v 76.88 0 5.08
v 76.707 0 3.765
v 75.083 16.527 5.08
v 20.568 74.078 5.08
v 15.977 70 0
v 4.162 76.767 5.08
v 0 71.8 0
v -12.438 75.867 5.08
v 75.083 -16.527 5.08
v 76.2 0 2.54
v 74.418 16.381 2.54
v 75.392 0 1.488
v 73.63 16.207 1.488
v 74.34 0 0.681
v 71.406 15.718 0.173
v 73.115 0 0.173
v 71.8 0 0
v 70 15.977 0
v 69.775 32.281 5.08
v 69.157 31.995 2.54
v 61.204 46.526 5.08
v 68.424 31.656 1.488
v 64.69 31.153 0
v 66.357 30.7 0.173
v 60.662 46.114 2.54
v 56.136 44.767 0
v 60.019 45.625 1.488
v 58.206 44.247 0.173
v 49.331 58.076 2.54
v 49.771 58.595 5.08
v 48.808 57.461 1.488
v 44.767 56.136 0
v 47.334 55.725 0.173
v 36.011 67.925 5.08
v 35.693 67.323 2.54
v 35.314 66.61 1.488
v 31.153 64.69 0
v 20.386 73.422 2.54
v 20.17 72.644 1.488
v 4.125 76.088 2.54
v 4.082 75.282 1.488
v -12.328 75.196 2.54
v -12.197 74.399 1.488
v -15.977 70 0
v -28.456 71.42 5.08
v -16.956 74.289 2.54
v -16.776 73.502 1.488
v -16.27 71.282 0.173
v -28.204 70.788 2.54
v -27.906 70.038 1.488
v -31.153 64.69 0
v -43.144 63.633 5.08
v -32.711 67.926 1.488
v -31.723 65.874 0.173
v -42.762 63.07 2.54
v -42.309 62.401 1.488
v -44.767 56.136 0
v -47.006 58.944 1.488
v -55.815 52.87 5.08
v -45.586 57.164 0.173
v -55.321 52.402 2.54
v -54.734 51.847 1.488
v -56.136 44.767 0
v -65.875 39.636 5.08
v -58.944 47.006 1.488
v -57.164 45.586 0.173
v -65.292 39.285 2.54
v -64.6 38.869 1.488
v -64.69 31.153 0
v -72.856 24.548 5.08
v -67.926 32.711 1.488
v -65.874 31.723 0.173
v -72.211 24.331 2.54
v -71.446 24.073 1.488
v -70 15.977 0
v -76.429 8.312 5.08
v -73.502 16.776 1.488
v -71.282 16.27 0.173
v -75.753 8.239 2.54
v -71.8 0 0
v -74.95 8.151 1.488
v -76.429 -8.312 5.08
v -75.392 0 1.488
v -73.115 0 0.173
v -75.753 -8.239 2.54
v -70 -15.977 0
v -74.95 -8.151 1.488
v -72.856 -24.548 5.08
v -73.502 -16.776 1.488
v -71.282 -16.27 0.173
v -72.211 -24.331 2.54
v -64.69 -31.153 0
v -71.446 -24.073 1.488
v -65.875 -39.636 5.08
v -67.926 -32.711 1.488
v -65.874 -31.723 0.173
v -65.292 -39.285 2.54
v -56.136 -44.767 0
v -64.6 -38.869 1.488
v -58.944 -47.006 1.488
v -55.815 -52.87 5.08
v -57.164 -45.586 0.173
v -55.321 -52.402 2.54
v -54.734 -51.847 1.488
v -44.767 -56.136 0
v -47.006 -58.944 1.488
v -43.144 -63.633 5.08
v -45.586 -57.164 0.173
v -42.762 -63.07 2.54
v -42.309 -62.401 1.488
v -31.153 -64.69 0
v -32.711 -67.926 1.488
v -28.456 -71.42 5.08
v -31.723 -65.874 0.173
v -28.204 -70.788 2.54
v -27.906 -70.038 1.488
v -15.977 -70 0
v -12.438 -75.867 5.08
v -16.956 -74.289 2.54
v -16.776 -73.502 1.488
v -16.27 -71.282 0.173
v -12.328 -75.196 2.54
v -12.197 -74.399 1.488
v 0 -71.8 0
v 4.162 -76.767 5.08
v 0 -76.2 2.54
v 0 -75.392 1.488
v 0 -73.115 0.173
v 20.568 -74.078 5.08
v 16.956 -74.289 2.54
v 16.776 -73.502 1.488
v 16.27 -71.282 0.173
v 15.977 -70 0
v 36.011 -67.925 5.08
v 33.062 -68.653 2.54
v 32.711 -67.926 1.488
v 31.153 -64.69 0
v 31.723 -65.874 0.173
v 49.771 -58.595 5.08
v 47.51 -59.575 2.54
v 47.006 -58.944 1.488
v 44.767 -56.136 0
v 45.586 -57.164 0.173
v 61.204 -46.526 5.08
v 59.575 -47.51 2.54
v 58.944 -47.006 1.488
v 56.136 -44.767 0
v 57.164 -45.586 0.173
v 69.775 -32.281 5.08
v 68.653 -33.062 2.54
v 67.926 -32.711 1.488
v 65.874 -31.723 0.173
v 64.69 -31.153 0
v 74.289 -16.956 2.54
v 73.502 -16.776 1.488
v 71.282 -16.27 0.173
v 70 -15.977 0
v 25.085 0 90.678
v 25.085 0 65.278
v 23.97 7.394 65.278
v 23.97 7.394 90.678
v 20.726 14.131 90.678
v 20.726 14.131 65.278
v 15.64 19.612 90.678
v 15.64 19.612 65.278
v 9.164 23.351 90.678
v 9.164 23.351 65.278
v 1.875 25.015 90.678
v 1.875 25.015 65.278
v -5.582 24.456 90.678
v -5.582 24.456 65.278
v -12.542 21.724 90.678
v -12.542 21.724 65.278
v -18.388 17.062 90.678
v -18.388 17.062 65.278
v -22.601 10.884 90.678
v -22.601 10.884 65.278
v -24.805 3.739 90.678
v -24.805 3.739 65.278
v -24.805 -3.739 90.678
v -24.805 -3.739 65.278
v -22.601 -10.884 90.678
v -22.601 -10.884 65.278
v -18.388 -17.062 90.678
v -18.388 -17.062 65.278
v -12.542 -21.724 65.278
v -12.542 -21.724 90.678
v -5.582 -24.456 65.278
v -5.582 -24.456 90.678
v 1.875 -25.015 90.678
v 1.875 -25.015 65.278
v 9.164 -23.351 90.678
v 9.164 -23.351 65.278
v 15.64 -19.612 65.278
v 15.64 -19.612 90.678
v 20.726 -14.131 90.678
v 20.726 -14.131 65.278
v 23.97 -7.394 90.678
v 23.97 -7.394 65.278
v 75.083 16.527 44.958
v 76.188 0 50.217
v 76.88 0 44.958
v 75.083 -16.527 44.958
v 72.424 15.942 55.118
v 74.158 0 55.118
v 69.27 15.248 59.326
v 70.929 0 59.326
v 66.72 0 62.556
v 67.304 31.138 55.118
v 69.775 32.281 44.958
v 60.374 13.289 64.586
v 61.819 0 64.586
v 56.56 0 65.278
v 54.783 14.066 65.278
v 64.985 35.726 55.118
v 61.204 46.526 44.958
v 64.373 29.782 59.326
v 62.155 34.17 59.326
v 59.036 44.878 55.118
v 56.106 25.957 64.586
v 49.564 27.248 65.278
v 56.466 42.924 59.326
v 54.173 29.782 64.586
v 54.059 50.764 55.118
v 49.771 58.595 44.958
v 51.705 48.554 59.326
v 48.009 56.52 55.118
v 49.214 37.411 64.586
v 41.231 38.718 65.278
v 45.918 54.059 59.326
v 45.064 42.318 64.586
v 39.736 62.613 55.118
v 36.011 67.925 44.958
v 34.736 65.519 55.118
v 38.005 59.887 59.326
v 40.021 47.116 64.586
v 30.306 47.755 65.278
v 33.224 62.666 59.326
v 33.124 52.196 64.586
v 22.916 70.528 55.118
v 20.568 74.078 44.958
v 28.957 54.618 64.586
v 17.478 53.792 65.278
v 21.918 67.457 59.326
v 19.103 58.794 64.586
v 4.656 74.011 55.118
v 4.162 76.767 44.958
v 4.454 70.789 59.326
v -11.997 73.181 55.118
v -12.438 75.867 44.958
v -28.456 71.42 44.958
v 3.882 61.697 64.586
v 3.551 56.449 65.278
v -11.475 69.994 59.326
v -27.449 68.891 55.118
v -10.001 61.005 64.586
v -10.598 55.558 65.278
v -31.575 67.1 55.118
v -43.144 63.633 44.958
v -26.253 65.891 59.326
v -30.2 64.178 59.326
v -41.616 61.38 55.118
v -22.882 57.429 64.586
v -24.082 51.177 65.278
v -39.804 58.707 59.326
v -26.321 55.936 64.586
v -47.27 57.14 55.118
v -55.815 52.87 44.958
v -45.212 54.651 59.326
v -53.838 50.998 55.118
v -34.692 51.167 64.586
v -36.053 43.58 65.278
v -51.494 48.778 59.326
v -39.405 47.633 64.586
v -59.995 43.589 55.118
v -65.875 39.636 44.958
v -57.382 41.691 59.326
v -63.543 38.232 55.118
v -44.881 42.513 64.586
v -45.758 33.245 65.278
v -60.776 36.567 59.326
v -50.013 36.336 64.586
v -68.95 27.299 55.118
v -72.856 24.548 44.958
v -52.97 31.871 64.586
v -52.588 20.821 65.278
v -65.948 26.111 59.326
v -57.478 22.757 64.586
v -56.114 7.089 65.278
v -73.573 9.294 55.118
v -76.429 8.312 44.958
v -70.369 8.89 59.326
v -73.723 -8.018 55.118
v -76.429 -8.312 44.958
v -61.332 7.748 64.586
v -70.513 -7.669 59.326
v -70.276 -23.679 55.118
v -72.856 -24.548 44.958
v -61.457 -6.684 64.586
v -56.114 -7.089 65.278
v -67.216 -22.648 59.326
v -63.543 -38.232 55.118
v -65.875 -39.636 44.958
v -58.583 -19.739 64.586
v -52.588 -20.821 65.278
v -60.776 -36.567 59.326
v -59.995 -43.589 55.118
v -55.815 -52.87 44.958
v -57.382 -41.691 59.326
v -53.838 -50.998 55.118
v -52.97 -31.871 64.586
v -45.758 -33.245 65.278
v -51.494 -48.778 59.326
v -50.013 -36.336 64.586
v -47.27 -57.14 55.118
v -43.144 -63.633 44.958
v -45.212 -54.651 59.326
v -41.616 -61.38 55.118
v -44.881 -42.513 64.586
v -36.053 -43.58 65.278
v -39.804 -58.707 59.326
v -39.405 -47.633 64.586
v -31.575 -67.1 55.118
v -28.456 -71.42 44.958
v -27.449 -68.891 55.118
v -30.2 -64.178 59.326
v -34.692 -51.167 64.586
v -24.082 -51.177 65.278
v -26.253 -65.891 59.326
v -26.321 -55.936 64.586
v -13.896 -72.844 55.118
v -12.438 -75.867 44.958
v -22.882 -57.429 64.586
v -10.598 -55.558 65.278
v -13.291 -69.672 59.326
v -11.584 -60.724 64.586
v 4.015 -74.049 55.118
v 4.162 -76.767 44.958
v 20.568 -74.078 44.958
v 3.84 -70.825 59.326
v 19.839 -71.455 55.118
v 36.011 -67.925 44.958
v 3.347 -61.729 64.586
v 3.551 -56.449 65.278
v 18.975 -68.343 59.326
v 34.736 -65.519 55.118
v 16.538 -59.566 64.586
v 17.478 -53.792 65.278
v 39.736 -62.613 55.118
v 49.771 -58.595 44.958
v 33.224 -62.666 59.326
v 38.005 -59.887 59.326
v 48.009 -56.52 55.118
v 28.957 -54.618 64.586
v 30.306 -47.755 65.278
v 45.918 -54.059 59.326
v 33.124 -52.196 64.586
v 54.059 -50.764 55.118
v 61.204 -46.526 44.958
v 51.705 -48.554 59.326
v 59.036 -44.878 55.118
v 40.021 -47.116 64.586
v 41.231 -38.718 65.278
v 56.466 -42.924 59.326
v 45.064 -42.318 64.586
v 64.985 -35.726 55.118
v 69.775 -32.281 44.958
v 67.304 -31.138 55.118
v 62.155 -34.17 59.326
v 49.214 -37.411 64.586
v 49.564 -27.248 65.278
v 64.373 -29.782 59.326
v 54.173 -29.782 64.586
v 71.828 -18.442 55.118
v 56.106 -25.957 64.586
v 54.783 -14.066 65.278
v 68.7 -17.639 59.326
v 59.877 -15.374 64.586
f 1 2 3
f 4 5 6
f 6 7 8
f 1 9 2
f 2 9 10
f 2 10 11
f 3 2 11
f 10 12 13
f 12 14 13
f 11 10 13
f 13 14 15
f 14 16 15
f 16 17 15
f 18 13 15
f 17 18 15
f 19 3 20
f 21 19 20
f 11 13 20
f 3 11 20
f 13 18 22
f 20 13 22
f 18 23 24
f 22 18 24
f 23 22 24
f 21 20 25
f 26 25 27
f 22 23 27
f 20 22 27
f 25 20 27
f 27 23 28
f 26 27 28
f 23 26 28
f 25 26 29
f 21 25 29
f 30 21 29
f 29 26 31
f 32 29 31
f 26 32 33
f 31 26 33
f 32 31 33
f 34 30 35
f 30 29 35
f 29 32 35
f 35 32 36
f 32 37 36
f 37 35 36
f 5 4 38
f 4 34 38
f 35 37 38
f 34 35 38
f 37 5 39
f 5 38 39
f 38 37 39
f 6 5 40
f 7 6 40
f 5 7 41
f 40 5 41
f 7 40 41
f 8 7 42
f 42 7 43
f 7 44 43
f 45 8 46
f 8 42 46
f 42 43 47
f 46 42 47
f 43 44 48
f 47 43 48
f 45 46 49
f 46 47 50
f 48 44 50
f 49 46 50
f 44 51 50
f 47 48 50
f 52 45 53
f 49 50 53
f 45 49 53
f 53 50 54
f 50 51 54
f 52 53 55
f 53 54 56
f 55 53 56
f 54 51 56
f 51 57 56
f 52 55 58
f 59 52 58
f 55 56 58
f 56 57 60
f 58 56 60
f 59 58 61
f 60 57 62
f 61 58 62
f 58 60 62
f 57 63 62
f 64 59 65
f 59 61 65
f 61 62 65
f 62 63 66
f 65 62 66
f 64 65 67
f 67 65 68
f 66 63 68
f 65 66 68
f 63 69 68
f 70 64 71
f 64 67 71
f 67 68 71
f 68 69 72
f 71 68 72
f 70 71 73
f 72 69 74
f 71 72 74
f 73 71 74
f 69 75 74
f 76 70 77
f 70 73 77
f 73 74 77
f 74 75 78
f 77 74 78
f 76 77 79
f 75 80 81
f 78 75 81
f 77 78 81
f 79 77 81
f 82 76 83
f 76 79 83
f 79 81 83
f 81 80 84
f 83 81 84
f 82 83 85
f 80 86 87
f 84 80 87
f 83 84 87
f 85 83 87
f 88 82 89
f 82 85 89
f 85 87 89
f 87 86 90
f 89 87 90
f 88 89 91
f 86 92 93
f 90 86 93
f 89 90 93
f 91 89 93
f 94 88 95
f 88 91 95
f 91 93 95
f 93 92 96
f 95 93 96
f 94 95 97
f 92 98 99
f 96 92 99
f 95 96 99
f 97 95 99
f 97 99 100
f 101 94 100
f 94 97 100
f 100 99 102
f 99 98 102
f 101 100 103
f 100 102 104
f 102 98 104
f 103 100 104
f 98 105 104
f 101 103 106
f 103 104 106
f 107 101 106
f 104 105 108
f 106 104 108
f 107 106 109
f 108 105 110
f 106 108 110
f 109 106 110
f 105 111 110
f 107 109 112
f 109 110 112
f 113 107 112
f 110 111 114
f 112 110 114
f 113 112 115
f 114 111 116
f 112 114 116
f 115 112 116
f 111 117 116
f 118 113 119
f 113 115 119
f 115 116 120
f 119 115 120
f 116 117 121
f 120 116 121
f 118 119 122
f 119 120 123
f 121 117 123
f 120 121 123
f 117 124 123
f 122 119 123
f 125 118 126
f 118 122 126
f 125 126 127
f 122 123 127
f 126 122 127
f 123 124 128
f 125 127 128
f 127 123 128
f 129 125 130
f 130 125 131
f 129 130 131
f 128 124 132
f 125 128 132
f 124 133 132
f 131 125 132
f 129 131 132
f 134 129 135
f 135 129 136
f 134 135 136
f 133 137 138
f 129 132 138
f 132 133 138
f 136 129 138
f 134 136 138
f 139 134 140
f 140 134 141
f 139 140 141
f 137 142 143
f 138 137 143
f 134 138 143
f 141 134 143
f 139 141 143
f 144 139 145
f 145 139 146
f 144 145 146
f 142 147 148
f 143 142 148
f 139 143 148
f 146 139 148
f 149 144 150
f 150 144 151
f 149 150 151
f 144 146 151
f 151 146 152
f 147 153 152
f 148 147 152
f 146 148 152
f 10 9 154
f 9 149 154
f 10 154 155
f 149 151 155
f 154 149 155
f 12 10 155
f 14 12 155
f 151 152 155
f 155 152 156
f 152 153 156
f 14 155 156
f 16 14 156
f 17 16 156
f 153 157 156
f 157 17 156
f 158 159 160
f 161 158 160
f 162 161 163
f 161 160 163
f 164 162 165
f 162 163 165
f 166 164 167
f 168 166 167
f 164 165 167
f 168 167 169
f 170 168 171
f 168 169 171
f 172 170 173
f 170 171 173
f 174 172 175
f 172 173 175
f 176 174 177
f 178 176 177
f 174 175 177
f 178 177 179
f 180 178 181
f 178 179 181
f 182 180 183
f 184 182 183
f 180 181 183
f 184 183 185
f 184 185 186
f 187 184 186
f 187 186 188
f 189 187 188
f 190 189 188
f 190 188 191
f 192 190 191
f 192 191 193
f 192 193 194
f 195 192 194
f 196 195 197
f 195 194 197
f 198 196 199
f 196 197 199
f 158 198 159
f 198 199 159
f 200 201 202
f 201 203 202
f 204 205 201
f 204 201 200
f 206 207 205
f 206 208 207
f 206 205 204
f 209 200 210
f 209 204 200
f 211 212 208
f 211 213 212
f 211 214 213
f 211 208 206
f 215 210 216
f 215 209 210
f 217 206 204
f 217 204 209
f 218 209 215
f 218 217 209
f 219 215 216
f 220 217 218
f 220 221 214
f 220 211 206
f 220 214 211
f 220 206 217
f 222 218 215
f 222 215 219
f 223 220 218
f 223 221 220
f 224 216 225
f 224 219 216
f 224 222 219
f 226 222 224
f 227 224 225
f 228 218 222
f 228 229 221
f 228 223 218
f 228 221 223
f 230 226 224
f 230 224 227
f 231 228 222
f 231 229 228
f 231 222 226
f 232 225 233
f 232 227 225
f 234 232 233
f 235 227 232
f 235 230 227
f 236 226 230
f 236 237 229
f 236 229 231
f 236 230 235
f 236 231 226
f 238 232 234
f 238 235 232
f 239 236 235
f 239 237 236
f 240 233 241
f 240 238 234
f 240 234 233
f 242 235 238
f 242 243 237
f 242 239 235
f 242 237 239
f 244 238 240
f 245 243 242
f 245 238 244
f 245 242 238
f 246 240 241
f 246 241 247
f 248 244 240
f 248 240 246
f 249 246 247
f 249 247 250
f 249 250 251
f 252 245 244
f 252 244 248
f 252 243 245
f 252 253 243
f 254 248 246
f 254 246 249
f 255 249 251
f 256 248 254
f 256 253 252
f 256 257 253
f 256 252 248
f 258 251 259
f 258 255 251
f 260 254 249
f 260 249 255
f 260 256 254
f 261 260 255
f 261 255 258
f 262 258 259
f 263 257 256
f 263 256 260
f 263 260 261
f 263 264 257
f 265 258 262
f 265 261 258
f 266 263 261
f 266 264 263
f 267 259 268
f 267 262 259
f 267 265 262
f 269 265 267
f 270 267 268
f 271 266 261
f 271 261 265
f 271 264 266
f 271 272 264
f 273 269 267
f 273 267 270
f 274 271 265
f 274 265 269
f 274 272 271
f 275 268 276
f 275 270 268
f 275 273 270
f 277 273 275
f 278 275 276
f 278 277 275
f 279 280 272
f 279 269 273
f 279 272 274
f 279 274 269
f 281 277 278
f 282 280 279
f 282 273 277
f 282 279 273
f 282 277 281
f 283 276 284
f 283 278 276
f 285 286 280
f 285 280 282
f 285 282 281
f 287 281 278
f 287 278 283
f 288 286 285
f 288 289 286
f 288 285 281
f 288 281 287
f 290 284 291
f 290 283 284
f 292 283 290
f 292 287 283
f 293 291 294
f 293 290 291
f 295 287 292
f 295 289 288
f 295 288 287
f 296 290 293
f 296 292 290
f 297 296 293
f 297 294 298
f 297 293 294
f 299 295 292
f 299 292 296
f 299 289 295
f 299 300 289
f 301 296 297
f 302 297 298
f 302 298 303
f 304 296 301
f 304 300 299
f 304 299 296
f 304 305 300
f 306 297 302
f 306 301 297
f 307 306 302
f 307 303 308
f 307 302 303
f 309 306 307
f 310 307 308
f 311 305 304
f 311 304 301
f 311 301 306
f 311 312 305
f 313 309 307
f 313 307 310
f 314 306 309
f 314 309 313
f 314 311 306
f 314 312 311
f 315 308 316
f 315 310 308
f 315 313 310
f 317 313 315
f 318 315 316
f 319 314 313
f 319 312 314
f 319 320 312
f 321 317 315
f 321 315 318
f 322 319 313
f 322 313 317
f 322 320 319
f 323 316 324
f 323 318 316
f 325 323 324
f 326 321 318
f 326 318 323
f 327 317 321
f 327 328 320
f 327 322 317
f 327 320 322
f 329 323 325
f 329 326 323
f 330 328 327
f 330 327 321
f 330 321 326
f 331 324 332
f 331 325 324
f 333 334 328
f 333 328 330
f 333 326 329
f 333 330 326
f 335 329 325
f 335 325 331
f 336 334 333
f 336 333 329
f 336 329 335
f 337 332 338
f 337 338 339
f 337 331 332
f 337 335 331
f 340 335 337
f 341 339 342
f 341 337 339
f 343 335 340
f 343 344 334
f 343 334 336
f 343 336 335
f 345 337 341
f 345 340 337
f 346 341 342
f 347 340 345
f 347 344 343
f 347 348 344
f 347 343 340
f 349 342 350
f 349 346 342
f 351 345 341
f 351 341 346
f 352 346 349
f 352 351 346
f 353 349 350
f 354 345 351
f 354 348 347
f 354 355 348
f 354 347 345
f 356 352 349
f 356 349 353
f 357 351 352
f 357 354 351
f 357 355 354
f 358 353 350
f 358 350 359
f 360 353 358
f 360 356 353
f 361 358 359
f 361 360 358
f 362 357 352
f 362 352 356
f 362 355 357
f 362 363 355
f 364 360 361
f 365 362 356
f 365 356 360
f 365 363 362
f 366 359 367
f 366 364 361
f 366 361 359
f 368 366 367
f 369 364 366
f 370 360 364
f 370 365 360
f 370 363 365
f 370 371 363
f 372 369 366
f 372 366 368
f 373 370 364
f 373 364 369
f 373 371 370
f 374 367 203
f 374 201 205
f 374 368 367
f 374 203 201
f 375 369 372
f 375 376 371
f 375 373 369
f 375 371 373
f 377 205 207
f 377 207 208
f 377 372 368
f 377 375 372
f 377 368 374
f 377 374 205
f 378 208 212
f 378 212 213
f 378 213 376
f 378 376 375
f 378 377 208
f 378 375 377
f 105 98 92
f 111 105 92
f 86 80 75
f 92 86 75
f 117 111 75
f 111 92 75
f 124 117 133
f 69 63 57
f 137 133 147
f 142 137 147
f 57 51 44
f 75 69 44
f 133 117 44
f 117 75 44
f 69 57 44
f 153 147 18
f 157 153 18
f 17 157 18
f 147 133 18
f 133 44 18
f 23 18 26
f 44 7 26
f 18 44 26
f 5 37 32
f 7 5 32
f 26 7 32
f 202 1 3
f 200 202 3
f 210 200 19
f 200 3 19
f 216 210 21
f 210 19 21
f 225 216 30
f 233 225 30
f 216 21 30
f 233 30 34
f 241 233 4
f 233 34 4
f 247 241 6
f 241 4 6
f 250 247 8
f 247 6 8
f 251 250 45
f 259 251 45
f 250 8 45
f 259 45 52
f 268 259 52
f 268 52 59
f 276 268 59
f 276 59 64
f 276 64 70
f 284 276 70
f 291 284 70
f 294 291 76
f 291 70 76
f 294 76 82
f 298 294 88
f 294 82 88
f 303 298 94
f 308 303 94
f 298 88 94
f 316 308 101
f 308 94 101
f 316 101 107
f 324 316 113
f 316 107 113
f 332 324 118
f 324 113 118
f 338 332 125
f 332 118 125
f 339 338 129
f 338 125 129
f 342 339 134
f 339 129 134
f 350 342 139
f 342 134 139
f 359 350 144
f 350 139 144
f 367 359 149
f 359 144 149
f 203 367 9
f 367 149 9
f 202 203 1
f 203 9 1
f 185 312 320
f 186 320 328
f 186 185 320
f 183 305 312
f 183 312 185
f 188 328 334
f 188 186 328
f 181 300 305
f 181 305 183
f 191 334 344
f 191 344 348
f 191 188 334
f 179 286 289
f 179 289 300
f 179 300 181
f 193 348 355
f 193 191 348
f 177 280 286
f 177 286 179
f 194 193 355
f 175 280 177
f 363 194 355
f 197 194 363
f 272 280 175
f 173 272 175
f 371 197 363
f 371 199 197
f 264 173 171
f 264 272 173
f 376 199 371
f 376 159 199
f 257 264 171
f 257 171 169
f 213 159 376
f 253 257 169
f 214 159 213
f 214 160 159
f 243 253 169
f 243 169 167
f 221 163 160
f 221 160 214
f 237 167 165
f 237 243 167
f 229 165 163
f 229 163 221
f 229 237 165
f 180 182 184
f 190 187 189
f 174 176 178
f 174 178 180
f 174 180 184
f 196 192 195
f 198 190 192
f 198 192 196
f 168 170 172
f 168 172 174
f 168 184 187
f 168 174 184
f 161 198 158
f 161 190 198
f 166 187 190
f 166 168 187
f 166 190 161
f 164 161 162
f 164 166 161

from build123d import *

# Parameters (mm, degrees)
F0_R     = 76.88013
F1_DEPTH = 65.278
F2_R     = 25.084702
F3_DEPTH = 25.4
F4_R     = 5.08
F5_R     = 20.32


with BuildPart() as f1:
    # F0 (on Top) → F1 (new body)
    with BuildSketch(Plane.XY):
        Circle(F0_R)
    extrude(amount=F1_DEPTH)

    # F2 (on face) → F3 (join)
    with BuildSketch(Plane.XY.offset(65.278)):
        Circle(F2_R)
    extrude(amount=F3_DEPTH)

    # F4
    f4_edges = [f1.edges().sort_by_distance(p)[0] for p in [
        (-76.88013, 0, 0),
    ]]
    fillet(f4_edges, radius=F4_R)

    # F5
    f5_edges = [f1.edges().sort_by_distance(p)[0] for p in [
        (-76.88013, 0, 65.278),
    ]]
    fillet(f5_edges, radius=F5_R)


solid = f1.part
